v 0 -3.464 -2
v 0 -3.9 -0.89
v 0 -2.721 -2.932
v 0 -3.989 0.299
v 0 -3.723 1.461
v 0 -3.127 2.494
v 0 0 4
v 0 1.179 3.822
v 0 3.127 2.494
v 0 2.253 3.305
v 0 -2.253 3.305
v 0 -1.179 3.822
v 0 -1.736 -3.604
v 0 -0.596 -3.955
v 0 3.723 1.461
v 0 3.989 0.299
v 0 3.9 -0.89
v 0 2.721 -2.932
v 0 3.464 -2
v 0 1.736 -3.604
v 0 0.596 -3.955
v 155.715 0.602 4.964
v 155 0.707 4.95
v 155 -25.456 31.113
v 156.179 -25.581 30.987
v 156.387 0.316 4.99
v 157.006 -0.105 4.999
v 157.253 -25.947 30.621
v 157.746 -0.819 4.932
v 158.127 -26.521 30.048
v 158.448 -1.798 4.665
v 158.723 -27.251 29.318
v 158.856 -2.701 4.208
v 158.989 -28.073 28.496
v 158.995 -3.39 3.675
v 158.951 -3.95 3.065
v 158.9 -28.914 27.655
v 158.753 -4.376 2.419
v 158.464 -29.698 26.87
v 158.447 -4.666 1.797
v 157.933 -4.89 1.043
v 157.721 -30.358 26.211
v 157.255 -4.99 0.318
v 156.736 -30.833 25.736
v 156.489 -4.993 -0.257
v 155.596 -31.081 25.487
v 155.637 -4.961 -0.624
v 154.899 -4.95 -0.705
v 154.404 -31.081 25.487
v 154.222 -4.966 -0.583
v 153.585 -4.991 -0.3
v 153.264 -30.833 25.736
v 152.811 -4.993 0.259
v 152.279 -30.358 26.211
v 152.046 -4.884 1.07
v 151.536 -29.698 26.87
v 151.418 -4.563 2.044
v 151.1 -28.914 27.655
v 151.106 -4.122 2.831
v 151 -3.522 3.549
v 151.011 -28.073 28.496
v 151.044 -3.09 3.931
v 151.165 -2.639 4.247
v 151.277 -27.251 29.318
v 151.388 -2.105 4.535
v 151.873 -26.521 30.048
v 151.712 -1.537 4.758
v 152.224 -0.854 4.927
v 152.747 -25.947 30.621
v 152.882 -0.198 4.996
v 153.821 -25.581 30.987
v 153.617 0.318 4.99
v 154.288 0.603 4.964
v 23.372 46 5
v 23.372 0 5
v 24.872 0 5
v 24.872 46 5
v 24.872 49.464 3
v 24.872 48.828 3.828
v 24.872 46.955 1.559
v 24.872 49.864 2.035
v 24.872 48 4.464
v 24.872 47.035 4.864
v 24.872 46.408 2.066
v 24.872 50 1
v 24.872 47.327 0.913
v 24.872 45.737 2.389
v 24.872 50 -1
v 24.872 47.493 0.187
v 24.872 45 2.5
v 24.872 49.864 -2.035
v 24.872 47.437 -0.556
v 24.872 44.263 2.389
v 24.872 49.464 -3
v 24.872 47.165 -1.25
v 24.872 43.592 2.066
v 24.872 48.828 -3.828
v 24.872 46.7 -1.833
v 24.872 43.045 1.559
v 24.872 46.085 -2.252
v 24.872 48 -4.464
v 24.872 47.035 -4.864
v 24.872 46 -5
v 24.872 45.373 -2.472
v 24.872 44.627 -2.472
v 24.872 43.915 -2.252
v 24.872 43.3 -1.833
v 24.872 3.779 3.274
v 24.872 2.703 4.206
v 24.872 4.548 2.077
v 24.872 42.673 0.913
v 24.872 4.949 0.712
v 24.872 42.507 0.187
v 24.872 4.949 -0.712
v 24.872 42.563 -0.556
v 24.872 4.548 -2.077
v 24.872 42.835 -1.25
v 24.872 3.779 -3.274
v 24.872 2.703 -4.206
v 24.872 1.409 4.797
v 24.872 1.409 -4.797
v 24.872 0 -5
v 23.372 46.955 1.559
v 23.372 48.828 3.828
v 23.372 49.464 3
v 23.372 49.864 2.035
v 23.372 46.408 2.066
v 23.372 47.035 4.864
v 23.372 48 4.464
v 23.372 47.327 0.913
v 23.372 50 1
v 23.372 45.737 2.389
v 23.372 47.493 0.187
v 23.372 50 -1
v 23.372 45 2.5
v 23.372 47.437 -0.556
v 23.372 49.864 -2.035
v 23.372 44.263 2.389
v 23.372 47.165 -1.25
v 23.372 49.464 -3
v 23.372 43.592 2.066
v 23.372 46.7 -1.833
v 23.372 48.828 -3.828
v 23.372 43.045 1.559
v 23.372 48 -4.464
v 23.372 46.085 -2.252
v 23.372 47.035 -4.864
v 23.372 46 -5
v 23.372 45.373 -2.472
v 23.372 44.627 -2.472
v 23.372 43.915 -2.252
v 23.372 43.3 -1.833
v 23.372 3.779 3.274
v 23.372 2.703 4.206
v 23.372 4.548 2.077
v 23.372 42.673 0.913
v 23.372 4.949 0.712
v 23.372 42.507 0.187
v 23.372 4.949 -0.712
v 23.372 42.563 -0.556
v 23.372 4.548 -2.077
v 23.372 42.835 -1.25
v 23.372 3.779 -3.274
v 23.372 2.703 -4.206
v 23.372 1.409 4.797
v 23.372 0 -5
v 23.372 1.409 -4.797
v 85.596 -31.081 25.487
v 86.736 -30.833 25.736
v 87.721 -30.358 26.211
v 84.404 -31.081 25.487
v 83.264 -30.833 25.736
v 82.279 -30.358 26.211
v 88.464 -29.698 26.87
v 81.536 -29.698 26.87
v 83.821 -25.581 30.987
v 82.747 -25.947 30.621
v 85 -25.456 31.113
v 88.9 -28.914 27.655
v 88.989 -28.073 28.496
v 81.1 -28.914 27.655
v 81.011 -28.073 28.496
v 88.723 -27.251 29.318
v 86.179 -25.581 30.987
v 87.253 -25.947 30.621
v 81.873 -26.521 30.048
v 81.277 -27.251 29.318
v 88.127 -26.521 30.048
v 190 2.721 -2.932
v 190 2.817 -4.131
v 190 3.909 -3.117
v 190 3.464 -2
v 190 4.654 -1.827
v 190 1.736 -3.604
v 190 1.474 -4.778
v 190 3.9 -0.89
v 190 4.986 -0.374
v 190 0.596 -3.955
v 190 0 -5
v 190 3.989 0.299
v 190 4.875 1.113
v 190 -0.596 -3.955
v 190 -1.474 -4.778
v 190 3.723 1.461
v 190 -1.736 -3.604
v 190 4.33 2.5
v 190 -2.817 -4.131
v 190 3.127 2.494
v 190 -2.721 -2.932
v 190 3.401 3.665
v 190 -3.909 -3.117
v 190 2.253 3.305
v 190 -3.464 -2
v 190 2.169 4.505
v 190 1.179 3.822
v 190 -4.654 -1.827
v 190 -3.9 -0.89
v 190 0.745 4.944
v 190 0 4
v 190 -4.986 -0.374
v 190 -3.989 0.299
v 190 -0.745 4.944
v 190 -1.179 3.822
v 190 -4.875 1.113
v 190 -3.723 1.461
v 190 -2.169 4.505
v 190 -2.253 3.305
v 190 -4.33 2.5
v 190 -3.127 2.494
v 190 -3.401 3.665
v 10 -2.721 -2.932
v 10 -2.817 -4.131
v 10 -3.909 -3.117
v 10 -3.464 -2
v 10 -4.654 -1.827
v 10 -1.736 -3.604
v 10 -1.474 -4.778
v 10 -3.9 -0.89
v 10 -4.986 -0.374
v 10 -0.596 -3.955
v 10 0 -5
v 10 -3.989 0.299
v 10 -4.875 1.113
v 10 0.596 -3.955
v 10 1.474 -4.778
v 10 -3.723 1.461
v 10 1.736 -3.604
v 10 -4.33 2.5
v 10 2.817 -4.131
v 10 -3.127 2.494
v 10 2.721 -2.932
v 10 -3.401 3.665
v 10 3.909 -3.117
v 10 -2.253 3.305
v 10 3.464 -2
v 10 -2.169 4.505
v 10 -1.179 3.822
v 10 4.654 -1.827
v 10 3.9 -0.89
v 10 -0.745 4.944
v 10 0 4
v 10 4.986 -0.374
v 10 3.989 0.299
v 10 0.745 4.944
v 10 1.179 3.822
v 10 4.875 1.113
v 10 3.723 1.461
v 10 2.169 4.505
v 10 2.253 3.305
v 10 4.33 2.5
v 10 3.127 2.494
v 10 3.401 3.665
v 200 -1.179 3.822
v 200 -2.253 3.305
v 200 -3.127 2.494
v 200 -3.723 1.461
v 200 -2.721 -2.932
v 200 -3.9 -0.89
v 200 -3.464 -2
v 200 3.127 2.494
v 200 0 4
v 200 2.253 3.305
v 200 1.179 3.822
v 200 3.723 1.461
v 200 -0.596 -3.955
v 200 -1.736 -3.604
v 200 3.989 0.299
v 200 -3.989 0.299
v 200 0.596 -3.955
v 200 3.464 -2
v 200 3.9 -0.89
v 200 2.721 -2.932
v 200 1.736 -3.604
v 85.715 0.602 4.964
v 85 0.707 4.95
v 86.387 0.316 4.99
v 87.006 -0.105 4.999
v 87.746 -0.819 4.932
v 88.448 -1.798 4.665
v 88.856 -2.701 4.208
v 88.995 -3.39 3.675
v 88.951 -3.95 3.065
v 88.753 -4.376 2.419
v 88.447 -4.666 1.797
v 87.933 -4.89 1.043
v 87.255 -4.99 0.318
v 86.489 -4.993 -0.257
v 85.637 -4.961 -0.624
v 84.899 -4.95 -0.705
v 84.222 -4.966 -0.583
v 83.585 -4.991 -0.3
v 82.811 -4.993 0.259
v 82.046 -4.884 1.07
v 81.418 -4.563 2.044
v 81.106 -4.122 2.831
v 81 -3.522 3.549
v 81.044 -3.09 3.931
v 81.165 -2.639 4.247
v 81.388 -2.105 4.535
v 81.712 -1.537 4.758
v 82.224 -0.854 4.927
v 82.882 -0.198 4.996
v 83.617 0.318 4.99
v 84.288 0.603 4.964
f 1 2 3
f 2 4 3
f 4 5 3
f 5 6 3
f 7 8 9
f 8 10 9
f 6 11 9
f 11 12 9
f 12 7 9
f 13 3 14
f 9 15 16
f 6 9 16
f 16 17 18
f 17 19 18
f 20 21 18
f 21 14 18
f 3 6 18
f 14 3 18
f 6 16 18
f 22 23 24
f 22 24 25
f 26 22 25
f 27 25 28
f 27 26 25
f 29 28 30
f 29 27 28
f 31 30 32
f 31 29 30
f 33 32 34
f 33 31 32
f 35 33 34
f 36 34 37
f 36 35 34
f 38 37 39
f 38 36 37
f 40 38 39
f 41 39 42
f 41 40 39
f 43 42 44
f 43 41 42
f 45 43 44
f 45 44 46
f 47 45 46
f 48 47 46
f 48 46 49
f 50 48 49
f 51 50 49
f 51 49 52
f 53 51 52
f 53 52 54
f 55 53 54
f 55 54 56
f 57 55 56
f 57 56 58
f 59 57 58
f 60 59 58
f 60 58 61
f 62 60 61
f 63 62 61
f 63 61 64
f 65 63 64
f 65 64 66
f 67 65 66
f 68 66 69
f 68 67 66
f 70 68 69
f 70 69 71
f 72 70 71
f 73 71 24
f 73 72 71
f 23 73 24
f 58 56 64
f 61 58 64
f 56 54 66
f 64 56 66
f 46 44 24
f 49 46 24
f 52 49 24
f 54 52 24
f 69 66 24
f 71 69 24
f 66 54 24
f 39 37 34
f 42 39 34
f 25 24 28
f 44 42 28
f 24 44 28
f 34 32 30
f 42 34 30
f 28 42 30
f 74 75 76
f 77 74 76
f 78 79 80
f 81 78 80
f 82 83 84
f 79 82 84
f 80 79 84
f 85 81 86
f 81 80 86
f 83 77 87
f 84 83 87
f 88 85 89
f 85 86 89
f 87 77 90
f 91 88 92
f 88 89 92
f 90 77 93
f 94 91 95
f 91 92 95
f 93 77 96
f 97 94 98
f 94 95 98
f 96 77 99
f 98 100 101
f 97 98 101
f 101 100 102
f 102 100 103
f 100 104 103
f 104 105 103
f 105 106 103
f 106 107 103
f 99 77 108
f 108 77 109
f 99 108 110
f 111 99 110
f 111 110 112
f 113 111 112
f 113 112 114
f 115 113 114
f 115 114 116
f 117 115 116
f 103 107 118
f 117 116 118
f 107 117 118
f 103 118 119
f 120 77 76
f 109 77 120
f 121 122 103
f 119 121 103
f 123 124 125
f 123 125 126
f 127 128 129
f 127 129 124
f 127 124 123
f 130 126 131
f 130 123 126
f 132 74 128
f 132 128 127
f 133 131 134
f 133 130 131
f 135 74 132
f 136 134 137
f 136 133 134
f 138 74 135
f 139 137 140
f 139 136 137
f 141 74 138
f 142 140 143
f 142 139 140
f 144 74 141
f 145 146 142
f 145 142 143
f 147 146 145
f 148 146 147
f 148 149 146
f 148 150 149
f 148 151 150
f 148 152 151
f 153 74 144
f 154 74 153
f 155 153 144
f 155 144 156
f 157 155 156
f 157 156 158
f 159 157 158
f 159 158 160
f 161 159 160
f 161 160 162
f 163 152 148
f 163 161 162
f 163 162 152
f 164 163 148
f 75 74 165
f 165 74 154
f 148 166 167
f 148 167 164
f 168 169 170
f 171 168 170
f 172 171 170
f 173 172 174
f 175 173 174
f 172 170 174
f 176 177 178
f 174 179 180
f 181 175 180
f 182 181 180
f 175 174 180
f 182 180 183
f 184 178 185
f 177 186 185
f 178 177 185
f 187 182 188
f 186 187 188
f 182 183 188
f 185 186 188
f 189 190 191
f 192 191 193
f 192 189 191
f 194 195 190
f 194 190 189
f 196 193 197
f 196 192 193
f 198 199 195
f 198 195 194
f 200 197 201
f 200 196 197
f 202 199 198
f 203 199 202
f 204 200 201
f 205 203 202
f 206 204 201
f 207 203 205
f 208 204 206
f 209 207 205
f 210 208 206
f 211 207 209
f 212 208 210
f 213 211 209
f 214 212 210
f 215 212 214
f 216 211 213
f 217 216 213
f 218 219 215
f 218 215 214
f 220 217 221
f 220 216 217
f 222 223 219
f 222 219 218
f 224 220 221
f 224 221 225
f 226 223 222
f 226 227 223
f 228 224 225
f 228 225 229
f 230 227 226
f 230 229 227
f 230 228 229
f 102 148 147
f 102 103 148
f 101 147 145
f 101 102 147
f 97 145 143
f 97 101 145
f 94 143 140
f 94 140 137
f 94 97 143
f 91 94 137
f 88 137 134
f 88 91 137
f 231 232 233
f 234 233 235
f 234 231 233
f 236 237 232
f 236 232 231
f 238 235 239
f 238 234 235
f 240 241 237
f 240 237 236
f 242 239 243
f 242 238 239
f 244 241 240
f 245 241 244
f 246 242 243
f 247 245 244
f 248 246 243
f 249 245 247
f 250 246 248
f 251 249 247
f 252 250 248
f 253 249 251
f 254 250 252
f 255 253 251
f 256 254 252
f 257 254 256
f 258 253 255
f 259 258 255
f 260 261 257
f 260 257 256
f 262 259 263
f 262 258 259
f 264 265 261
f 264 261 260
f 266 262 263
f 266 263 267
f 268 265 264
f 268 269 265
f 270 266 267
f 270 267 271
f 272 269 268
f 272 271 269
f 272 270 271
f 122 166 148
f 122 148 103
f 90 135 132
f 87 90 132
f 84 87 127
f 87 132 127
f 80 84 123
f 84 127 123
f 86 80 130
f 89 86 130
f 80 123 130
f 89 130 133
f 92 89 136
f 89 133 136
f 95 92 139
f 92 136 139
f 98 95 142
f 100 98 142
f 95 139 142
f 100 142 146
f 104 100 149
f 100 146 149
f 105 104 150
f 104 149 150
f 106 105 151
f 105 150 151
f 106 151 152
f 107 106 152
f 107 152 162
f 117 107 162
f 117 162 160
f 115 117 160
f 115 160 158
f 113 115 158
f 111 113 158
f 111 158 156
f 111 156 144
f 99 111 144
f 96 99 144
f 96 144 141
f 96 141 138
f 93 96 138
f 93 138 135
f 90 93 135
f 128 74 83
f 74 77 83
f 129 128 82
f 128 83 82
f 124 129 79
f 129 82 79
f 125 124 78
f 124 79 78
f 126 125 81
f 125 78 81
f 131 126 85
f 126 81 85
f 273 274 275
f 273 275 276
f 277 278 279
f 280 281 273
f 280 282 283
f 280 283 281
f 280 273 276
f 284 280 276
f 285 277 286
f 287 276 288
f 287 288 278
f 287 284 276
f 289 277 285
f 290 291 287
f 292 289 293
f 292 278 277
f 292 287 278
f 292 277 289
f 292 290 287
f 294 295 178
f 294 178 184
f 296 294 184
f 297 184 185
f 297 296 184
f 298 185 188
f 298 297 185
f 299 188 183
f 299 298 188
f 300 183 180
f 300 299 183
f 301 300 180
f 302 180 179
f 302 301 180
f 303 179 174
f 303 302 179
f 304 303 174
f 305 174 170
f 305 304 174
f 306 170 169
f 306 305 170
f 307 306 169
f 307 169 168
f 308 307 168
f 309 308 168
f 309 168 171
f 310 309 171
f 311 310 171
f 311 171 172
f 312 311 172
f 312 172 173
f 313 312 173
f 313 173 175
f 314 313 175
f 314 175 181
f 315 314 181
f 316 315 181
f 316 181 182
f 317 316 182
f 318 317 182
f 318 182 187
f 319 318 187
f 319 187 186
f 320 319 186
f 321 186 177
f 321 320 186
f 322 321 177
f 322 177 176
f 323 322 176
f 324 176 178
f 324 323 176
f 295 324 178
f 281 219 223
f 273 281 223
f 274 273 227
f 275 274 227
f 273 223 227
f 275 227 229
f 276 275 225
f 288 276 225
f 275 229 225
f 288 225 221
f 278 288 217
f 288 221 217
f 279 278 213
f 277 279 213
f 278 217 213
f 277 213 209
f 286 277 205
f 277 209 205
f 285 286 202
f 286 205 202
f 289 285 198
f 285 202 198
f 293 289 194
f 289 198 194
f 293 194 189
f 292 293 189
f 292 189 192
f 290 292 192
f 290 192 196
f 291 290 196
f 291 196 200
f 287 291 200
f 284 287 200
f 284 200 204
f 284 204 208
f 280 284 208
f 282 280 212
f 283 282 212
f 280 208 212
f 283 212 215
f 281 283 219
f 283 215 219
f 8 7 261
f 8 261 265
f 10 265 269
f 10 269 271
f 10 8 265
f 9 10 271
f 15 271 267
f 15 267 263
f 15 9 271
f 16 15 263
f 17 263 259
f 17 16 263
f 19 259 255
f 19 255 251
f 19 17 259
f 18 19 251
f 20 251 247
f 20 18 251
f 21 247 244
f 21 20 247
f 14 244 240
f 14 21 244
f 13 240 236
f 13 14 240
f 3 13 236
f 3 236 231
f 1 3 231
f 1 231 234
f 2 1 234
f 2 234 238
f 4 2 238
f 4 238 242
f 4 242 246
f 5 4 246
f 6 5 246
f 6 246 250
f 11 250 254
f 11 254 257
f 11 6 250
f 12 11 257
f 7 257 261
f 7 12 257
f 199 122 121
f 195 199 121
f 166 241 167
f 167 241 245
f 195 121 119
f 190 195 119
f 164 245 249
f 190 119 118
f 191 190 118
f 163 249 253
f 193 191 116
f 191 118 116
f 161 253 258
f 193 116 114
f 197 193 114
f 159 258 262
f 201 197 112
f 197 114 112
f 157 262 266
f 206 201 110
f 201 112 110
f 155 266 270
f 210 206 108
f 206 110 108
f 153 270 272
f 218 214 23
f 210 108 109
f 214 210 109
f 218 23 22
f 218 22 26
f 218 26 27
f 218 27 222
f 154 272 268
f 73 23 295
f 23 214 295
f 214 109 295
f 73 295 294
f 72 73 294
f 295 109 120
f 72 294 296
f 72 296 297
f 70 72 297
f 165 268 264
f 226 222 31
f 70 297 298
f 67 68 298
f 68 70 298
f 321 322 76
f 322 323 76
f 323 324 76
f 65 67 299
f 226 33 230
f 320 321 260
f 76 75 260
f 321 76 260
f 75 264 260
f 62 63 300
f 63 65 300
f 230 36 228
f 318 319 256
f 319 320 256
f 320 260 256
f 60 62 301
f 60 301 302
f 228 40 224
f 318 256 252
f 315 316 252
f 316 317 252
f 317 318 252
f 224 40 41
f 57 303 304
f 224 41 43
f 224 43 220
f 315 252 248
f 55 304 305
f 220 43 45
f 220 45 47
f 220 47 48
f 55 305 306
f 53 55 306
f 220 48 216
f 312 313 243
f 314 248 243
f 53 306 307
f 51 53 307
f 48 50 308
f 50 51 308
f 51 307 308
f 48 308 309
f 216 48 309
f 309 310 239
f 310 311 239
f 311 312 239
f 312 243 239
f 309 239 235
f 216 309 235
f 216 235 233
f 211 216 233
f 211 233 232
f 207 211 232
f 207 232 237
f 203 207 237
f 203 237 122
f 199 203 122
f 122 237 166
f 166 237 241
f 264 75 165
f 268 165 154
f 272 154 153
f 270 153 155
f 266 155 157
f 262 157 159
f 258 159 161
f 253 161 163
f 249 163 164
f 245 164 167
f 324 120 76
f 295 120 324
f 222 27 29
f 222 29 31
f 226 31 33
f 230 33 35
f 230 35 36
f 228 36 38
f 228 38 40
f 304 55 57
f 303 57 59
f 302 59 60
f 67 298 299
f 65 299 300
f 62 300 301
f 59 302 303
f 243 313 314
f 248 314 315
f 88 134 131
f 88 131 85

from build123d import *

# Parameters (mm, degrees)
SKETCH1_R           = 5
BOSS_EXTRUDE1_DEPTH = 200
SKETCH3_R           = 5
SKETCH3_R_2         = 4
CUT_EXTRUDE1_DEPTH  = 10
CUT_EXTRUDE2_START  = -10
SKETCH4_R           = 5
SKETCH4_R_2         = 4
CUT_EXTRUDE2_DEPTH  = 10
SKETCH5_W           = 1.5
SKETCH5_H           = 10
BOSS_EXTRUDE2_DEPTH = 50
SKETCH6_R           = 2.5
CUT_EXTRUDE3_DEPTH  = 50
FILLET1_R           = 4
SKETCH8_R           = 4
BOSS_EXTRUDE3_DEPTH = 40


with BuildPart() as part:
    # Sketch1 → Boss-Extrude1 (new body)
    with BuildSketch(Plane(origin=(0, 0, 0), x_dir=(0, 0, -1), z_dir=(1, 0, 0))):
        Circle(SKETCH1_R)
    extrude(amount=BOSS_EXTRUDE1_DEPTH)

    # Sketch3 → Cut-Extrude1 (cut)
    with BuildSketch(Plane.ZY):
        Circle(SKETCH3_R)
        Circle(SKETCH3_R_2, mode=Mode.SUBTRACT)
    extrude(amount=-CUT_EXTRUDE1_DEPTH, mode=Mode.SUBTRACT)

    # Sketch4 → Cut-Extrude2 (cut)
    with BuildSketch(Plane(origin=(200, 0, 0), x_dir=(0, 0, -1), z_dir=(1, 0, 0)).offset(CUT_EXTRUDE2_START)):
        with Locations(Location((0, 0, 0), (0, 0, 180))):
            Circle(SKETCH4_R)
        with Locations(Location((0, 0, 0), (0, 0, 180))):
            Circle(SKETCH4_R_2, mode=Mode.SUBTRACT)
    extrude(amount=CUT_EXTRUDE2_DEPTH, mode=Mode.SUBTRACT)

    # Sketch5 → Boss-Extrude2 (add)
    with BuildSketch(Plane(origin=(0, 0, 0), x_dir=(1, 0, 0), z_dir=(0, 1, 0))):
        with Locations((24.122206293, 0)):
            Rectangle(SKETCH5_W, SKETCH5_H)
    extrude(amount=BOSS_EXTRUDE2_DEPTH)

    # Sketch6 → Cut-Extrude3 (cut)
    with BuildSketch(Plane.ZY.offset(-23.372206293)):
        with Locations((0, 45)):
            Circle(SKETCH6_R)
    extrude(amount=-CUT_EXTRUDE3_DEPTH, mode=Mode.SUBTRACT)

    # Fillet1
    fillet1_edges = [part.edges().sort_by_distance(p)[0] for p in [
        (24.122206293, 50, -5),
        (24.122206293, 50, 5),
    ]]
    fillet(fillet1_edges, radius=FILLET1_R)

    # Sketch8 → Boss-Extrude3 (add)
    with BuildSketch(Plane(origin=(0, 0, 0), x_dir=(0, 0.7071067811865462, 0.7071067811865488), z_dir=(-8.296615423026079e-08, 0.7071067811865465, -0.7071067811865439))):
        with Locations((0, 155)):
            Circle(SKETCH8_R)
        with Locations((0, 85)):
            Circle(SKETCH8_R)
    extrude(amount=-BOSS_EXTRUDE3_DEPTH)


solid = part.part
